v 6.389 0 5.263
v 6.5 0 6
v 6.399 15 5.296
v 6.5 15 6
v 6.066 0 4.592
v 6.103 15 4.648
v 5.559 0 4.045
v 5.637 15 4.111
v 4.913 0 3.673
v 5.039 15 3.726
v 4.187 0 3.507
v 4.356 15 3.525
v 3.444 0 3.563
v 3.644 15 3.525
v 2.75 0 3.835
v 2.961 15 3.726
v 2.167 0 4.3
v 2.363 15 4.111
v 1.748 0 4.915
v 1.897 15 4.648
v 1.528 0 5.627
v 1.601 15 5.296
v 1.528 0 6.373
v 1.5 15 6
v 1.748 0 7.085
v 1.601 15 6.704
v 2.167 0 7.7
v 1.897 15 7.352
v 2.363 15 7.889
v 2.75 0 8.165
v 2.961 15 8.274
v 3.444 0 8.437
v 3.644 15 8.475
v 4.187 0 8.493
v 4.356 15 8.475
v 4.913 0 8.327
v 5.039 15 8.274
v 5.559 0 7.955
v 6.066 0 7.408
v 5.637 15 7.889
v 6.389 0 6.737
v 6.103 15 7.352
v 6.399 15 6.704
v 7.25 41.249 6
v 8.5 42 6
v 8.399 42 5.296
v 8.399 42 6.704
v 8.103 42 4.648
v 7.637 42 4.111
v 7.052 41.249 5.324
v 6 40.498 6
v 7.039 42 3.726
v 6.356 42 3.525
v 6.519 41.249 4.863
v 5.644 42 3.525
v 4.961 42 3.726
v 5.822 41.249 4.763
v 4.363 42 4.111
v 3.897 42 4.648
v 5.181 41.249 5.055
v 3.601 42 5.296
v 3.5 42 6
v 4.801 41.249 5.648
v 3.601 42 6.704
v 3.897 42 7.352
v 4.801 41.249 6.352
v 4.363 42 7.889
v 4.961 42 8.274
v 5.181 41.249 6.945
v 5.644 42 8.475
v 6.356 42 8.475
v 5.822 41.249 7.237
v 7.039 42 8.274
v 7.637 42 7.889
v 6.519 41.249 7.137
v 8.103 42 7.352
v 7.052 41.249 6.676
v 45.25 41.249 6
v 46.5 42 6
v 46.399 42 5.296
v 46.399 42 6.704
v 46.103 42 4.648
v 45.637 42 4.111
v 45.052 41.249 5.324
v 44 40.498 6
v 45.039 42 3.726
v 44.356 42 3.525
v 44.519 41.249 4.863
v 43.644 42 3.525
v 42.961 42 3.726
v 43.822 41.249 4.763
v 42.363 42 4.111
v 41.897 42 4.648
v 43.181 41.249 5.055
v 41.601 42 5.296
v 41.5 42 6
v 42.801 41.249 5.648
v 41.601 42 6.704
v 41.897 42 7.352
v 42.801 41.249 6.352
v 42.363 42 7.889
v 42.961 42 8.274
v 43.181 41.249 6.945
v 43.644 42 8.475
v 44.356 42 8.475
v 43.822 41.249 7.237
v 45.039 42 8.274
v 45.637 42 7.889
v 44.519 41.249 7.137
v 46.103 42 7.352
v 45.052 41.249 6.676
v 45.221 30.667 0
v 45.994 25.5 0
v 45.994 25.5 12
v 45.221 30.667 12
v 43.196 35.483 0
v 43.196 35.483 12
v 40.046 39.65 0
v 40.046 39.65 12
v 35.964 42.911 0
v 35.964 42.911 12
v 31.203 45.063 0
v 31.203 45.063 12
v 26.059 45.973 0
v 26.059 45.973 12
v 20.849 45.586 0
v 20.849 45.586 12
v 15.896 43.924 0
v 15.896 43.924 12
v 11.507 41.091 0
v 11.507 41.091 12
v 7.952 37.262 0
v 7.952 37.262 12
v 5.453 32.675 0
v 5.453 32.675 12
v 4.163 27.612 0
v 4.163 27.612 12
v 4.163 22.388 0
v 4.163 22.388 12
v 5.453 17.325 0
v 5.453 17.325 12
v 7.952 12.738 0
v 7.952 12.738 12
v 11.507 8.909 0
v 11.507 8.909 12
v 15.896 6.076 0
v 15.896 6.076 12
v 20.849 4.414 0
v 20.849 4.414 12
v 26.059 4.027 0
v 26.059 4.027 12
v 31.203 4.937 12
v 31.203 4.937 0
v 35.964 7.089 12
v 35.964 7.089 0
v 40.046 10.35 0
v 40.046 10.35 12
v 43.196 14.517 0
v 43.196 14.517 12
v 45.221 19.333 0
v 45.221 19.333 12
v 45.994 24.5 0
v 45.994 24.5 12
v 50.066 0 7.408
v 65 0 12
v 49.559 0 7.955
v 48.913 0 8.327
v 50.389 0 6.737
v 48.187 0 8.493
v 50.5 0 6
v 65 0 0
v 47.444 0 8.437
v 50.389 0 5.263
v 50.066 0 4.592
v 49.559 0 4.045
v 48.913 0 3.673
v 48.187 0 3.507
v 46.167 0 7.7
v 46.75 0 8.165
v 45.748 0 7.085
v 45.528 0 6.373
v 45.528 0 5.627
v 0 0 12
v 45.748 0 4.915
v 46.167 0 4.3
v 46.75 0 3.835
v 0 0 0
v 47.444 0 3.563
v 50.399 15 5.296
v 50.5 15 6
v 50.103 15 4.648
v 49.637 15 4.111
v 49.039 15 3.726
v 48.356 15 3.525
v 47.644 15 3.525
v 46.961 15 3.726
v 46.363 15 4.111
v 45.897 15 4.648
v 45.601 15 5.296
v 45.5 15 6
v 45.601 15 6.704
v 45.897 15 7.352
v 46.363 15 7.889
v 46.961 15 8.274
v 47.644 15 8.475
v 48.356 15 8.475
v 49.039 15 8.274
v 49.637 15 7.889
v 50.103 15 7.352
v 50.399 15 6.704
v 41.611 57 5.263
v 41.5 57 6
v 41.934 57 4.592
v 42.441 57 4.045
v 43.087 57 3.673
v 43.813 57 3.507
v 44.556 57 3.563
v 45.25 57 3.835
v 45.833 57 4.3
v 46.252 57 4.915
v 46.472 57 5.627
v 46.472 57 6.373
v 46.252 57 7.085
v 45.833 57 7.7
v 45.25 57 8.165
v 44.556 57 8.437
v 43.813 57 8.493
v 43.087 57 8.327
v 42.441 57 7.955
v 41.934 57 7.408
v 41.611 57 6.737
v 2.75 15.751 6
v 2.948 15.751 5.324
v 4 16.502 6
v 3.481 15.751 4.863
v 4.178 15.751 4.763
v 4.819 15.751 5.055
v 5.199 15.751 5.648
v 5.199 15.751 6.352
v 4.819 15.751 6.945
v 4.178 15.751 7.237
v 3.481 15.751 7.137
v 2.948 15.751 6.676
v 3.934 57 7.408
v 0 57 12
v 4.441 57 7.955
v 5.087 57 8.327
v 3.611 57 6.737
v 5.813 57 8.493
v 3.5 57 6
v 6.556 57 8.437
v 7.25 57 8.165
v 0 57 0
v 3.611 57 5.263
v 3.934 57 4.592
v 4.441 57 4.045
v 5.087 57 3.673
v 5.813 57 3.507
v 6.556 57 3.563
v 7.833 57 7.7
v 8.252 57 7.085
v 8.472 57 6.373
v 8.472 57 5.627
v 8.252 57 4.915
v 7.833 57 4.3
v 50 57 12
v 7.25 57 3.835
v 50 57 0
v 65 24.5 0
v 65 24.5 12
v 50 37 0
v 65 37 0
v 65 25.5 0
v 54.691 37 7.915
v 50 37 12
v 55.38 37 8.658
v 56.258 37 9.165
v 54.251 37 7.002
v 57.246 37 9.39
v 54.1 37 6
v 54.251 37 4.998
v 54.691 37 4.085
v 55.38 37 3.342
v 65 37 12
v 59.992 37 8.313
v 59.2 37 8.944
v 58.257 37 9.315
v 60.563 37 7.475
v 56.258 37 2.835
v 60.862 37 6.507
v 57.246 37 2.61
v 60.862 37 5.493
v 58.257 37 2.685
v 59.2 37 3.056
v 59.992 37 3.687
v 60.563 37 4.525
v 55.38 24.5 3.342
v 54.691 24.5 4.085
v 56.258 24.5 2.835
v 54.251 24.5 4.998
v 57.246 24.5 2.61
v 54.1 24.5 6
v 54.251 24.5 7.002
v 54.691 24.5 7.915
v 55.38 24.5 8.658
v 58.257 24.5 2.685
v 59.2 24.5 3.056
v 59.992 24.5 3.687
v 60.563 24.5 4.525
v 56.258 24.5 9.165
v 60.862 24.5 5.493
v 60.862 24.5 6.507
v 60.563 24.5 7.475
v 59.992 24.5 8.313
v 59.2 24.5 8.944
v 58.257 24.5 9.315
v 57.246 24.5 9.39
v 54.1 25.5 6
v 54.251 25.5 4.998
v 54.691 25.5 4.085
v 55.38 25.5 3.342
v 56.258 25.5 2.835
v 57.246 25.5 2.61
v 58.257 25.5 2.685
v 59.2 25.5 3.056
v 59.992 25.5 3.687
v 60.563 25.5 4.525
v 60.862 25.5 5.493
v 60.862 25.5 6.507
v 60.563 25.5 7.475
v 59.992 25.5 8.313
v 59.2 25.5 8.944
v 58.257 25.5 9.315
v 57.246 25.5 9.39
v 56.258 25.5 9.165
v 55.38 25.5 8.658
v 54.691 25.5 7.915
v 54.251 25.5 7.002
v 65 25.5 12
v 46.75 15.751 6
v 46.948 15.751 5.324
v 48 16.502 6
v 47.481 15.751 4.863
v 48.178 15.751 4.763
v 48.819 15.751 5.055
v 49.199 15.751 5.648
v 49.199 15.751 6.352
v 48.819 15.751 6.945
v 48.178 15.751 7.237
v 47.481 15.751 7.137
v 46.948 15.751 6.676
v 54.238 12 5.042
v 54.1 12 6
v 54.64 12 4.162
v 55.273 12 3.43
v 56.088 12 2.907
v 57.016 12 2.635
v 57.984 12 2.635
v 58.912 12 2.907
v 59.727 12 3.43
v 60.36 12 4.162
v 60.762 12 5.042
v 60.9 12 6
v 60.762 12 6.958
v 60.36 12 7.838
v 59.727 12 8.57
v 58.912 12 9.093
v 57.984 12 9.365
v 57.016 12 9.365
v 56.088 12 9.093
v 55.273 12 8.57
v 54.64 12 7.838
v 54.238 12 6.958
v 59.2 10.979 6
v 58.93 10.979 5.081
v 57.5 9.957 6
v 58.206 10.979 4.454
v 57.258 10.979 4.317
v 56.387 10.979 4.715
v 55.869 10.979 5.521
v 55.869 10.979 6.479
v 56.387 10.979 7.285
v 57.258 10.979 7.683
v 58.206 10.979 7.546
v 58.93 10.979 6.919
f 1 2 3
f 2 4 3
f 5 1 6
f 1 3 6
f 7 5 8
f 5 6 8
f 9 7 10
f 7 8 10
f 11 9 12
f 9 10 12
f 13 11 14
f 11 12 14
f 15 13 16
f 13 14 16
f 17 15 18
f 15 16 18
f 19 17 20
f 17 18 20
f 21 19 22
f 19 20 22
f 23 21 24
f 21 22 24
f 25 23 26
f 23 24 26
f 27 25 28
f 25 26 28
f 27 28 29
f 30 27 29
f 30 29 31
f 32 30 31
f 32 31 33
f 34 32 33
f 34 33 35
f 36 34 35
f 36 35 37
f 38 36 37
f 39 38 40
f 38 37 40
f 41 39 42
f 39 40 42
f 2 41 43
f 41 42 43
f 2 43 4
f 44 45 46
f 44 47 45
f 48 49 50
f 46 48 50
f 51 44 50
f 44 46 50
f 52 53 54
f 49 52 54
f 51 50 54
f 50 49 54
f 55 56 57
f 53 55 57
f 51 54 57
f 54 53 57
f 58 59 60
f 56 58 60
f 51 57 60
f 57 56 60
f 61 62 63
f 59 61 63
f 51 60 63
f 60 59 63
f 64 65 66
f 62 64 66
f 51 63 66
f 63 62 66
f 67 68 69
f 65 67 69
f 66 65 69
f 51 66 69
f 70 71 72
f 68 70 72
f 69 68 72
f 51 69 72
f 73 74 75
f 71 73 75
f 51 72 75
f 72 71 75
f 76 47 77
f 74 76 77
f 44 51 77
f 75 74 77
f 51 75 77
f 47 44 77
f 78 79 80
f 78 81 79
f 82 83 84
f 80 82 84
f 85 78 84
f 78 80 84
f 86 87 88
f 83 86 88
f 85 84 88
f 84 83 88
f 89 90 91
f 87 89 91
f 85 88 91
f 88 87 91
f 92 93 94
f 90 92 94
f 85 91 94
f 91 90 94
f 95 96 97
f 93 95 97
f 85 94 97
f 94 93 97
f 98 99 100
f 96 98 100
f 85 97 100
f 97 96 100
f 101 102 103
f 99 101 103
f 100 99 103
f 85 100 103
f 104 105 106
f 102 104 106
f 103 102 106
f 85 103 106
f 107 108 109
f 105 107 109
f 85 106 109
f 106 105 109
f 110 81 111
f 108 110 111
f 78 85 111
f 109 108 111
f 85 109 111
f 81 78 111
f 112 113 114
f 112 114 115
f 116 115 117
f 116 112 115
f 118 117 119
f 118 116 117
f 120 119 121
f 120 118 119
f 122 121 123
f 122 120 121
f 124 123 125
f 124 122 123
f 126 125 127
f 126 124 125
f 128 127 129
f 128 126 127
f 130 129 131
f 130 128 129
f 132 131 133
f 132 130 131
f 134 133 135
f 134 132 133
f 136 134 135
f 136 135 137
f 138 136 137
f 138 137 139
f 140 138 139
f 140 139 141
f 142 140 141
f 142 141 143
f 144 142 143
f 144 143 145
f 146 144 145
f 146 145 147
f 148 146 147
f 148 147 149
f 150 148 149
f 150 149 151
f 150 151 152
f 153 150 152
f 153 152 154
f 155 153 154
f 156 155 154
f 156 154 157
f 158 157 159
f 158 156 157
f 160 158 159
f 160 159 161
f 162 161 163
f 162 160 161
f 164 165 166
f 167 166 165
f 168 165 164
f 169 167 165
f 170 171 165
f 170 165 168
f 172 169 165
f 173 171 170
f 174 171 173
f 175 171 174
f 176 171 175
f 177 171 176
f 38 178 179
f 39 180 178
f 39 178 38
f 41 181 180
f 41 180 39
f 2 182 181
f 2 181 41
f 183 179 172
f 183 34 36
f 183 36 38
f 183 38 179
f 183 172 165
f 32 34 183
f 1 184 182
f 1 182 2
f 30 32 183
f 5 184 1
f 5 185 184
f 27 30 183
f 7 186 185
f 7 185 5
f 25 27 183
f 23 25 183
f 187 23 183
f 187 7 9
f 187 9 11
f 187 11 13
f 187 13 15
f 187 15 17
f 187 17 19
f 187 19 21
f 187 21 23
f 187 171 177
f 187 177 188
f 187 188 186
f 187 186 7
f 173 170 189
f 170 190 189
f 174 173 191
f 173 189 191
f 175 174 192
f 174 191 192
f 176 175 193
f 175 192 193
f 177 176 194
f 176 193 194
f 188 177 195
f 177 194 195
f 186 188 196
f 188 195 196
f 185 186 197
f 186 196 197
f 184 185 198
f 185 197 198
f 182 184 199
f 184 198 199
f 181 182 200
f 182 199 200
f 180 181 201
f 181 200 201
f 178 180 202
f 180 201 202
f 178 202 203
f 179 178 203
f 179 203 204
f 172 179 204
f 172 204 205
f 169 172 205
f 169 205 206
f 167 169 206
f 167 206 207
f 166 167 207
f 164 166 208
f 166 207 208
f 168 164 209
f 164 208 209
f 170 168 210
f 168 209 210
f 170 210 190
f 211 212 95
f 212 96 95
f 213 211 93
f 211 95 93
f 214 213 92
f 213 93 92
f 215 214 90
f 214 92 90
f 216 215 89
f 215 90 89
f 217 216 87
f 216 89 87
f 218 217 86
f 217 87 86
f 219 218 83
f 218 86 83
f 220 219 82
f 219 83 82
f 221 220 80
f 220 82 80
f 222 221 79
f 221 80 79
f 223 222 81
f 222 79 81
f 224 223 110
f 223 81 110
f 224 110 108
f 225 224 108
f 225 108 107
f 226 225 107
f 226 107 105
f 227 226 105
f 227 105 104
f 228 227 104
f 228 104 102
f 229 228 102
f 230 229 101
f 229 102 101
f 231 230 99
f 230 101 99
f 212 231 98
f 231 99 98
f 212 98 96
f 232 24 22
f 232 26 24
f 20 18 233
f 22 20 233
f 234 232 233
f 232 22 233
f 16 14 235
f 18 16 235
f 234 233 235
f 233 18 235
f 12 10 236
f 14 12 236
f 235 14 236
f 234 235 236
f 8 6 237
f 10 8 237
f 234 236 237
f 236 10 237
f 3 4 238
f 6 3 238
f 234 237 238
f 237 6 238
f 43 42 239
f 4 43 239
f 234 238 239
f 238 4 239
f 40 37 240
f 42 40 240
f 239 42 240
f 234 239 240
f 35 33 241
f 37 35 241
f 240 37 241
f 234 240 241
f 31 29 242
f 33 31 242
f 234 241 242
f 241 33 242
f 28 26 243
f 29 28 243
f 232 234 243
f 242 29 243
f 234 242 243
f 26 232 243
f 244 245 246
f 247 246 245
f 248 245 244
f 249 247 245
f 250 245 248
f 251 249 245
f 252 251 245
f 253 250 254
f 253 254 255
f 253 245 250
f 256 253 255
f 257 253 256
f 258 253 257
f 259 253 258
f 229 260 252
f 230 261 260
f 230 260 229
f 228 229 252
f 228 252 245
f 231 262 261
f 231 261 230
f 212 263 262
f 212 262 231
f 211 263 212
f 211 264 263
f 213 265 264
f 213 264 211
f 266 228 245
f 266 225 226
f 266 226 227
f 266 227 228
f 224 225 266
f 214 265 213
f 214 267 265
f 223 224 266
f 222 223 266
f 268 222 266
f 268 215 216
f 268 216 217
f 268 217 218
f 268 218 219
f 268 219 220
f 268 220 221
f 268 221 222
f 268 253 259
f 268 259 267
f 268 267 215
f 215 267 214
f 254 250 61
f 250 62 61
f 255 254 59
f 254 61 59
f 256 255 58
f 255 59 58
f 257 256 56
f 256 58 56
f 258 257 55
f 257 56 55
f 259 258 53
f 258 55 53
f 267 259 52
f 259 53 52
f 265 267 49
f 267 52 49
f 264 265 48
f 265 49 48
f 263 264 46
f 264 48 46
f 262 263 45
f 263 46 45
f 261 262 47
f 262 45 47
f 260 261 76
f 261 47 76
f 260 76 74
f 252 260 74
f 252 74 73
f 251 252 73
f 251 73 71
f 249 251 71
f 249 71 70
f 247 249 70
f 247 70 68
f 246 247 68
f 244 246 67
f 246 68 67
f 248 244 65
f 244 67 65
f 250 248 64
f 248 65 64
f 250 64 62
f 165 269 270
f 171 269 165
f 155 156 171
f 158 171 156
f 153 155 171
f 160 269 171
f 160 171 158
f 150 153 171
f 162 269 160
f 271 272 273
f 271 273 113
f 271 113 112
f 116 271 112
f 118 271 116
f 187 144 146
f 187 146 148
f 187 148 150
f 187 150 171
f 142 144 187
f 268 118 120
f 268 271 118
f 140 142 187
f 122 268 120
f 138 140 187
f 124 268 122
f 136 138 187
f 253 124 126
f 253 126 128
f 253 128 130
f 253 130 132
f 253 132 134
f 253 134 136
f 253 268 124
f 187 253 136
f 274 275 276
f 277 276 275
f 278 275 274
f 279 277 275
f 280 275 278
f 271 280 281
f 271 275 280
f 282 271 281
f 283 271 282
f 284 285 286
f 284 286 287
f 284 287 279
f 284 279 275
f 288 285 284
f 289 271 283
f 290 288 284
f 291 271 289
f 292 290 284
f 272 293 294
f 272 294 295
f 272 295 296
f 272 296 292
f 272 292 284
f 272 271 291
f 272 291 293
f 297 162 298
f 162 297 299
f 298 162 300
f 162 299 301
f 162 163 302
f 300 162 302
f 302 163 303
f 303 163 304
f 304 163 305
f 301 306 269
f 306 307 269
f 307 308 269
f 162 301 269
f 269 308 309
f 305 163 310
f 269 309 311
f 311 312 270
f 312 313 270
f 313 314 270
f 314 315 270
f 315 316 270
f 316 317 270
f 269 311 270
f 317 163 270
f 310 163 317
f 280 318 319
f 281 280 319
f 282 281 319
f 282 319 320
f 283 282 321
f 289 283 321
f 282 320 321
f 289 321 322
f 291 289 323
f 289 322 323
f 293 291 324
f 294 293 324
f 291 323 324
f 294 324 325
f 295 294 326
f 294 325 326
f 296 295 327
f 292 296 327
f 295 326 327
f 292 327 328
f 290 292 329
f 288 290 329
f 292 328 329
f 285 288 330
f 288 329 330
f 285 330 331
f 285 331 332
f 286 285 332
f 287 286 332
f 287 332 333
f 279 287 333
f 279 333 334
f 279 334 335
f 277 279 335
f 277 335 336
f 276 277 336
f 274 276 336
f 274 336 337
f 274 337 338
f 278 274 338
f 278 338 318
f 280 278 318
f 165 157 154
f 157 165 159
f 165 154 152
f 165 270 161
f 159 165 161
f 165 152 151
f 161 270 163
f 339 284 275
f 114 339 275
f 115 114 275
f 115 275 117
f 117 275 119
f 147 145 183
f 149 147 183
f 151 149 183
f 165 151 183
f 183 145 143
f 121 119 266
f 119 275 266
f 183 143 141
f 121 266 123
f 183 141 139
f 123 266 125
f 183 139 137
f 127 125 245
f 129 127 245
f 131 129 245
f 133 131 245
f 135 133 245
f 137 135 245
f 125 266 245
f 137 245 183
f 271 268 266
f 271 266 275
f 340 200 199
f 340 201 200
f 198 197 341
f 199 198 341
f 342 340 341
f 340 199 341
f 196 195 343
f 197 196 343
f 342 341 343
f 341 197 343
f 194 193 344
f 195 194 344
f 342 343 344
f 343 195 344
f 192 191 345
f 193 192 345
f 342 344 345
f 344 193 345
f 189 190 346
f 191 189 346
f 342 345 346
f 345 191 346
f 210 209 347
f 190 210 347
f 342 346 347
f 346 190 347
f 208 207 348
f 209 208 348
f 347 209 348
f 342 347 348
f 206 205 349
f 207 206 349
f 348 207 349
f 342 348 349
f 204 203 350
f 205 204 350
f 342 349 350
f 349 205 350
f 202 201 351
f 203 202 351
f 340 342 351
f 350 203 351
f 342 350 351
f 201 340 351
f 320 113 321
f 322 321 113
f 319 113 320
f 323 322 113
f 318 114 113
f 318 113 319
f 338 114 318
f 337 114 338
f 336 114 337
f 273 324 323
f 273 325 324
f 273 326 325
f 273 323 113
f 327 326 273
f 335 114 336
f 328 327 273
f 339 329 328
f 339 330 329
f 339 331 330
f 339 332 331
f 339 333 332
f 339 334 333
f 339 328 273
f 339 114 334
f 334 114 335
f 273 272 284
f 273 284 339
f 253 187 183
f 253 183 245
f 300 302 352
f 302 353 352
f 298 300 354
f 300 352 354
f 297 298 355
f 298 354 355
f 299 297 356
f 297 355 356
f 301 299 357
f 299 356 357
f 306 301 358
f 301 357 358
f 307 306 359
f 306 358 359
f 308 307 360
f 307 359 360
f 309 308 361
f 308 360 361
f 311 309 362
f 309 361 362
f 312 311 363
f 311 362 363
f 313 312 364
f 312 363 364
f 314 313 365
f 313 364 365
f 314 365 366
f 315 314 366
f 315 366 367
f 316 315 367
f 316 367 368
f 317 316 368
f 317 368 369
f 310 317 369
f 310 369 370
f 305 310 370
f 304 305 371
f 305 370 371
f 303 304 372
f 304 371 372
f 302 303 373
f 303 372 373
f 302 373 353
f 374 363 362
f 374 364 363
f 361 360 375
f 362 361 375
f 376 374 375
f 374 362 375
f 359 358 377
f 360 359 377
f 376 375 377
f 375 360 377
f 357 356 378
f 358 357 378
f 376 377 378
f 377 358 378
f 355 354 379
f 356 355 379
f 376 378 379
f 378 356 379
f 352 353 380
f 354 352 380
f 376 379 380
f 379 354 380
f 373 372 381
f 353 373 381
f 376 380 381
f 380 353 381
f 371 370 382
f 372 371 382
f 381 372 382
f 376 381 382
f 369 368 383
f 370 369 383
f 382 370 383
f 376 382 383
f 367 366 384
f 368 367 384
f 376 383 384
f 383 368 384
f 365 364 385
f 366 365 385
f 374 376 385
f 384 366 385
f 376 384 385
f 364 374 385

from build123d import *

# Parameters (mm, degrees)
ESBO_O1_R                                   = 21
RESSALTO_EXTRUS_O1_DEPTH                    = 12
ESBO_O2_W                                   = 20
ESBO_O2_H                                   = 1
CORTE_EXTRUS_O1_DEPTH                       = 88.281154896
BROCA_DE_ROSQUEAR_PARA_TARRAXA_DE_M81_D     = 6.8
BROCA_DE_ROSQUEAR_PARA_TARRAXA_DE_M81_DEPTH = 25
BROCA_DE_ROSQUEAR_PARA_TARRAXA_DE_M81_TIP   = 2.042926105
BROCA_DE_ROSQUEAR_PARA_TARRAXA_DE_M62_D     = 5
BROCA_DE_ROSQUEAR_PARA_TARRAXA_DE_M62_DEPTH = 15
BROCA_DE_ROSQUEAR_PARA_TARRAXA_DE_M62_TIP   = 1.502151548
BROCA_DE_ROSQUEAR_PARA_TARRAXA_DE_M63_D     = 5
BROCA_DE_ROSQUEAR_PARA_TARRAXA_DE_M63_DEPTH = 15
BROCA_DE_ROSQUEAR_PARA_TARRAXA_DE_M63_TIP   = 1.502151548


with BuildPart() as part:
    # Esboço1 → Ressalto-extrusão1 (new body)
    with BuildSketch(Plane.XY):
        Polygon((0, 0), (0, 57), (50, 57), (50, 37), (65, 37), (65, 0), align=None)
        with Locations((25, 25)):
            Circle(ESBO_O1_R, mode=Mode.SUBTRACT)
    extrude(amount=RESSALTO_EXTRUS_O1_DEPTH)

    # Esboço2 → Corte-extrusão1 (cut, through all)
    with BuildSketch(Plane.XY.offset(12)):
        with Locations((55, 25)):
            Rectangle(ESBO_O2_W, ESBO_O2_H)
    extrude(amount=-CORTE_EXTRUS_O1_DEPTH, mode=Mode.SUBTRACT)

    # Broca de rosquear para tarraxa de M81
    with Locations(Plane(origin=(0, 37, 0), x_dir=(1, 0, 0), z_dir=(0, 1, 0))):
        with Locations((57.5, -6)):
            Hole(BROCA_DE_ROSQUEAR_PARA_TARRAXA_DE_M81_D / 2, depth=BROCA_DE_ROSQUEAR_PARA_TARRAXA_DE_M81_DEPTH)
            with Locations((0, 0, -(BROCA_DE_ROSQUEAR_PARA_TARRAXA_DE_M81_DEPTH + BROCA_DE_ROSQUEAR_PARA_TARRAXA_DE_M81_TIP / 2))):  # 118° drill point
                Cone(0, BROCA_DE_ROSQUEAR_PARA_TARRAXA_DE_M81_D / 2, BROCA_DE_ROSQUEAR_PARA_TARRAXA_DE_M81_TIP, mode=Mode.SUBTRACT)

    # Broca de rosquear para tarraxa de M62
    with Locations(Plane(origin=(0, 57, 0), x_dir=(1, 0, 0), z_dir=(0, 1, 0))):
        with Locations((6, -6), (44, -6)):
            Hole(BROCA_DE_ROSQUEAR_PARA_TARRAXA_DE_M62_D / 2, depth=BROCA_DE_ROSQUEAR_PARA_TARRAXA_DE_M62_DEPTH)
            with Locations((0, 0, -(BROCA_DE_ROSQUEAR_PARA_TARRAXA_DE_M62_DEPTH + BROCA_DE_ROSQUEAR_PARA_TARRAXA_DE_M62_TIP / 2))):  # 118° drill point
                Cone(0, BROCA_DE_ROSQUEAR_PARA_TARRAXA_DE_M62_D / 2, BROCA_DE_ROSQUEAR_PARA_TARRAXA_DE_M62_TIP, mode=Mode.SUBTRACT)

    # Broca de rosquear para tarraxa de M63
    with Locations(Plane(origin=(0, 0, 0), x_dir=(-1, 0, 0), z_dir=(0, -1, 0))):
        with Locations((-4, -6), (-48, -6)):
            Hole(BROCA_DE_ROSQUEAR_PARA_TARRAXA_DE_M63_D / 2, depth=BROCA_DE_ROSQUEAR_PARA_TARRAXA_DE_M63_DEPTH)
            with Locations((0, 0, -(BROCA_DE_ROSQUEAR_PARA_TARRAXA_DE_M63_DEPTH + BROCA_DE_ROSQUEAR_PARA_TARRAXA_DE_M63_TIP / 2))):  # 118° drill point
                Cone(0, BROCA_DE_ROSQUEAR_PARA_TARRAXA_DE_M63_D / 2, BROCA_DE_ROSQUEAR_PARA_TARRAXA_DE_M63_TIP, mode=Mode.SUBTRACT)


solid = part.part
